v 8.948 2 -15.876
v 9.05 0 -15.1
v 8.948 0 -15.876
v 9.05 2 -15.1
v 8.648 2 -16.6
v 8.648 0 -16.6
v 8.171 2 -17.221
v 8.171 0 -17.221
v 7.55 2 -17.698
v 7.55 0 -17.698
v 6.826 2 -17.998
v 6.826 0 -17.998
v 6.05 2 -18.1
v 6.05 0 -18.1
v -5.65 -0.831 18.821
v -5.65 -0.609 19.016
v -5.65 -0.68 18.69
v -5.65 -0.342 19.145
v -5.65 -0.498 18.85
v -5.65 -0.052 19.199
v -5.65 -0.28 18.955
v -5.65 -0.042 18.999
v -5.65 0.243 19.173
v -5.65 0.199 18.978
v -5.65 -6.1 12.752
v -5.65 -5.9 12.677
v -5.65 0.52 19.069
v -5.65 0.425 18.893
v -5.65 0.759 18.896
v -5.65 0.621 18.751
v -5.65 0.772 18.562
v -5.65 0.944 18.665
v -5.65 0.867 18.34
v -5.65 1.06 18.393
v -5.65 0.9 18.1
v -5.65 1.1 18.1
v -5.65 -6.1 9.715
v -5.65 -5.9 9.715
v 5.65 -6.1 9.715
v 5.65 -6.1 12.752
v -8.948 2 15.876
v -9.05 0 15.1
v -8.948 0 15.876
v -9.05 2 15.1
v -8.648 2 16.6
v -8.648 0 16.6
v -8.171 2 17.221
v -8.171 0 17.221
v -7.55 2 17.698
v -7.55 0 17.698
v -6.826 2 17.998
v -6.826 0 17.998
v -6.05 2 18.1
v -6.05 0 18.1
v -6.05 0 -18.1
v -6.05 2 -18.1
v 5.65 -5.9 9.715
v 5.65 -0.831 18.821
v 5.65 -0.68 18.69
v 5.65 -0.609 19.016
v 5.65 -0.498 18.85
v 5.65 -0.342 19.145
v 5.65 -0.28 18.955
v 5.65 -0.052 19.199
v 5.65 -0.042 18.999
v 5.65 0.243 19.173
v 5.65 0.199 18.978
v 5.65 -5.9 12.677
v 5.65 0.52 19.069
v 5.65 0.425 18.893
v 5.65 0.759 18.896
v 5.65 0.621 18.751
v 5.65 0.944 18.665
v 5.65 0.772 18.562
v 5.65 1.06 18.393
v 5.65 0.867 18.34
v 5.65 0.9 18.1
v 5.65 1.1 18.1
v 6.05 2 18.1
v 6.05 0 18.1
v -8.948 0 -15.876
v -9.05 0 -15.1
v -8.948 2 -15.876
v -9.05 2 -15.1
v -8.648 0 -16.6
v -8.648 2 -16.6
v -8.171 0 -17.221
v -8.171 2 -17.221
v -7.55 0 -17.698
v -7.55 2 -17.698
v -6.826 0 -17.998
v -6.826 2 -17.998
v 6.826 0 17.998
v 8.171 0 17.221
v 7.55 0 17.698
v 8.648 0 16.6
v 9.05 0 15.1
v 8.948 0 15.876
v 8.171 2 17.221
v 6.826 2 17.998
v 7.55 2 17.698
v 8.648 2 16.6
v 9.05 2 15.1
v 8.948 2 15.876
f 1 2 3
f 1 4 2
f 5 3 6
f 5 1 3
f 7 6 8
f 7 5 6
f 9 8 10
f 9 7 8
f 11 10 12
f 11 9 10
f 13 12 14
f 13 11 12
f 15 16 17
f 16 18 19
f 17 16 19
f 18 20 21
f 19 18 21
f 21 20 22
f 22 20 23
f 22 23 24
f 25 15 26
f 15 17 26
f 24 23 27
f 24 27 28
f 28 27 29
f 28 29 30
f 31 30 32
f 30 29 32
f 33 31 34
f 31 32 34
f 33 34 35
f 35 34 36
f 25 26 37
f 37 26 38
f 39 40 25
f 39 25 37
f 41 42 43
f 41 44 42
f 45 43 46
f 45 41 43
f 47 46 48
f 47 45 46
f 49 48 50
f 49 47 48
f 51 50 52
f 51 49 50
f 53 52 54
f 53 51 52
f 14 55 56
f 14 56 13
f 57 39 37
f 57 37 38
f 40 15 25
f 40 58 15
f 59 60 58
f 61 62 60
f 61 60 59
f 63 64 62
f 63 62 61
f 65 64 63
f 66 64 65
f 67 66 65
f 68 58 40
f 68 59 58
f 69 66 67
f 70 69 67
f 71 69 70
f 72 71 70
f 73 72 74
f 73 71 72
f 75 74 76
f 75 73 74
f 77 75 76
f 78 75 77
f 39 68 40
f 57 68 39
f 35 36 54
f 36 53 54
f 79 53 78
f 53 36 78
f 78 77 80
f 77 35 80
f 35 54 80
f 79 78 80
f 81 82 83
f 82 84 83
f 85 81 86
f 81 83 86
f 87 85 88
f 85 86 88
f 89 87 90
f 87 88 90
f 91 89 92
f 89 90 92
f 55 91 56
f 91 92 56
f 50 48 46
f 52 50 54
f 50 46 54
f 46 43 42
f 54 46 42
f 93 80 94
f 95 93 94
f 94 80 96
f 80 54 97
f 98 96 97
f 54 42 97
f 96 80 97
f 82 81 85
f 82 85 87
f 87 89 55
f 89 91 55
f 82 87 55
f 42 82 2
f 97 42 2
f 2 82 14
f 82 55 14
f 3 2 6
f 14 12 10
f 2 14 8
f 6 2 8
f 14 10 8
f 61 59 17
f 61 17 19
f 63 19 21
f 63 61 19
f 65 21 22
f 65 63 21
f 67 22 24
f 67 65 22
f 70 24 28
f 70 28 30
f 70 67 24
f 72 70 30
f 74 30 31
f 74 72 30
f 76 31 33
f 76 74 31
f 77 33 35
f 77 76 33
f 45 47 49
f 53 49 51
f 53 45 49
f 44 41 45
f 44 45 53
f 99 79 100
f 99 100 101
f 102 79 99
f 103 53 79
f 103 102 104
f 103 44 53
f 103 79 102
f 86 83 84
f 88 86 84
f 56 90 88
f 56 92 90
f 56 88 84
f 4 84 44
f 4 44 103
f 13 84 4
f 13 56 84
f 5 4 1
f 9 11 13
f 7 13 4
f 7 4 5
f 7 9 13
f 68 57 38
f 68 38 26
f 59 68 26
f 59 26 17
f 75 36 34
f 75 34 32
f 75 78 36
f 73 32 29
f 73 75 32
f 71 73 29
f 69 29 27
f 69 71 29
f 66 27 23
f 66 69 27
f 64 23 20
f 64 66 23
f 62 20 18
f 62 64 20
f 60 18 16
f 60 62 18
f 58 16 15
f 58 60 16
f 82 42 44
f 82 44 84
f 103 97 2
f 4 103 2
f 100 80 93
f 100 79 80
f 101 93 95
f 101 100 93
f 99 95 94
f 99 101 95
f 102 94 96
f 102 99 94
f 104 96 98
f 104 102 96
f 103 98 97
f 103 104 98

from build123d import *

# Parameters (mm, degrees)
SKETCH_1_W      = 18.1
SKETCH_1_H      = 36.2
EXTRUDE_1_DEPTH = 2
FILLET_1_R      = 3
EXTRUDE_2_DEPTH = 5.65


with BuildPart() as part:
    # 草图1 → 凸台-拉伸1 (new body)
    with BuildSketch(Plane(origin=(0, 0, 0), x_dir=(1, 0, 0), z_dir=(0, 1, 0))):
        Rectangle(SKETCH_1_W, SKETCH_1_H)
    extrude(amount=EXTRUDE_1_DEPTH)

    # 圆角1
    fillet_1_edges = [part.edges().sort_by_distance(p)[0] for p in [
        (9.05, 1, 18.1),
        (-9.05, 1, 18.1),
        (-9.05, 1, -18.1),
        (9.05, 1, -18.1),
    ]]
    fillet(fillet_1_edges, radius=FILLET_1_R)

    # 草图2 → 凸台-拉伸2 (add, symmetric)
    with BuildSketch(Plane(origin=(0, 0, 0), x_dir=(0, 0, -1), z_dir=(1, 0, 0))):
        with BuildLine():
            Line((-18.821174134, -0.830606928), (-12.752189981, -6.1))
            Line((-12.752189981, -6.1), (-9.714835193, -6.1))
            Line((-9.714835193, -6.1), (-9.714835193, -5.9))
            Line((-9.714835193, -5.9), (-12.677480404, -5.9))
            Line((-12.677480404, -5.9), (-18.690051564, -0.679587486))
            ThreePointArc((-18.690051564, -0.679587486), (-18.943098078, 0.314937504), (-18.1, 0.9))
            Line((-18.1, 0.9), (-18.1, 1.1))
            ThreePointArc((-18.1, 1.1), (-19.130453206, 0.384923615), (-18.821174134, -0.830606928))
        make_face()
    extrude(amount=EXTRUDE_2_DEPTH, both=True)


solid = part.part
